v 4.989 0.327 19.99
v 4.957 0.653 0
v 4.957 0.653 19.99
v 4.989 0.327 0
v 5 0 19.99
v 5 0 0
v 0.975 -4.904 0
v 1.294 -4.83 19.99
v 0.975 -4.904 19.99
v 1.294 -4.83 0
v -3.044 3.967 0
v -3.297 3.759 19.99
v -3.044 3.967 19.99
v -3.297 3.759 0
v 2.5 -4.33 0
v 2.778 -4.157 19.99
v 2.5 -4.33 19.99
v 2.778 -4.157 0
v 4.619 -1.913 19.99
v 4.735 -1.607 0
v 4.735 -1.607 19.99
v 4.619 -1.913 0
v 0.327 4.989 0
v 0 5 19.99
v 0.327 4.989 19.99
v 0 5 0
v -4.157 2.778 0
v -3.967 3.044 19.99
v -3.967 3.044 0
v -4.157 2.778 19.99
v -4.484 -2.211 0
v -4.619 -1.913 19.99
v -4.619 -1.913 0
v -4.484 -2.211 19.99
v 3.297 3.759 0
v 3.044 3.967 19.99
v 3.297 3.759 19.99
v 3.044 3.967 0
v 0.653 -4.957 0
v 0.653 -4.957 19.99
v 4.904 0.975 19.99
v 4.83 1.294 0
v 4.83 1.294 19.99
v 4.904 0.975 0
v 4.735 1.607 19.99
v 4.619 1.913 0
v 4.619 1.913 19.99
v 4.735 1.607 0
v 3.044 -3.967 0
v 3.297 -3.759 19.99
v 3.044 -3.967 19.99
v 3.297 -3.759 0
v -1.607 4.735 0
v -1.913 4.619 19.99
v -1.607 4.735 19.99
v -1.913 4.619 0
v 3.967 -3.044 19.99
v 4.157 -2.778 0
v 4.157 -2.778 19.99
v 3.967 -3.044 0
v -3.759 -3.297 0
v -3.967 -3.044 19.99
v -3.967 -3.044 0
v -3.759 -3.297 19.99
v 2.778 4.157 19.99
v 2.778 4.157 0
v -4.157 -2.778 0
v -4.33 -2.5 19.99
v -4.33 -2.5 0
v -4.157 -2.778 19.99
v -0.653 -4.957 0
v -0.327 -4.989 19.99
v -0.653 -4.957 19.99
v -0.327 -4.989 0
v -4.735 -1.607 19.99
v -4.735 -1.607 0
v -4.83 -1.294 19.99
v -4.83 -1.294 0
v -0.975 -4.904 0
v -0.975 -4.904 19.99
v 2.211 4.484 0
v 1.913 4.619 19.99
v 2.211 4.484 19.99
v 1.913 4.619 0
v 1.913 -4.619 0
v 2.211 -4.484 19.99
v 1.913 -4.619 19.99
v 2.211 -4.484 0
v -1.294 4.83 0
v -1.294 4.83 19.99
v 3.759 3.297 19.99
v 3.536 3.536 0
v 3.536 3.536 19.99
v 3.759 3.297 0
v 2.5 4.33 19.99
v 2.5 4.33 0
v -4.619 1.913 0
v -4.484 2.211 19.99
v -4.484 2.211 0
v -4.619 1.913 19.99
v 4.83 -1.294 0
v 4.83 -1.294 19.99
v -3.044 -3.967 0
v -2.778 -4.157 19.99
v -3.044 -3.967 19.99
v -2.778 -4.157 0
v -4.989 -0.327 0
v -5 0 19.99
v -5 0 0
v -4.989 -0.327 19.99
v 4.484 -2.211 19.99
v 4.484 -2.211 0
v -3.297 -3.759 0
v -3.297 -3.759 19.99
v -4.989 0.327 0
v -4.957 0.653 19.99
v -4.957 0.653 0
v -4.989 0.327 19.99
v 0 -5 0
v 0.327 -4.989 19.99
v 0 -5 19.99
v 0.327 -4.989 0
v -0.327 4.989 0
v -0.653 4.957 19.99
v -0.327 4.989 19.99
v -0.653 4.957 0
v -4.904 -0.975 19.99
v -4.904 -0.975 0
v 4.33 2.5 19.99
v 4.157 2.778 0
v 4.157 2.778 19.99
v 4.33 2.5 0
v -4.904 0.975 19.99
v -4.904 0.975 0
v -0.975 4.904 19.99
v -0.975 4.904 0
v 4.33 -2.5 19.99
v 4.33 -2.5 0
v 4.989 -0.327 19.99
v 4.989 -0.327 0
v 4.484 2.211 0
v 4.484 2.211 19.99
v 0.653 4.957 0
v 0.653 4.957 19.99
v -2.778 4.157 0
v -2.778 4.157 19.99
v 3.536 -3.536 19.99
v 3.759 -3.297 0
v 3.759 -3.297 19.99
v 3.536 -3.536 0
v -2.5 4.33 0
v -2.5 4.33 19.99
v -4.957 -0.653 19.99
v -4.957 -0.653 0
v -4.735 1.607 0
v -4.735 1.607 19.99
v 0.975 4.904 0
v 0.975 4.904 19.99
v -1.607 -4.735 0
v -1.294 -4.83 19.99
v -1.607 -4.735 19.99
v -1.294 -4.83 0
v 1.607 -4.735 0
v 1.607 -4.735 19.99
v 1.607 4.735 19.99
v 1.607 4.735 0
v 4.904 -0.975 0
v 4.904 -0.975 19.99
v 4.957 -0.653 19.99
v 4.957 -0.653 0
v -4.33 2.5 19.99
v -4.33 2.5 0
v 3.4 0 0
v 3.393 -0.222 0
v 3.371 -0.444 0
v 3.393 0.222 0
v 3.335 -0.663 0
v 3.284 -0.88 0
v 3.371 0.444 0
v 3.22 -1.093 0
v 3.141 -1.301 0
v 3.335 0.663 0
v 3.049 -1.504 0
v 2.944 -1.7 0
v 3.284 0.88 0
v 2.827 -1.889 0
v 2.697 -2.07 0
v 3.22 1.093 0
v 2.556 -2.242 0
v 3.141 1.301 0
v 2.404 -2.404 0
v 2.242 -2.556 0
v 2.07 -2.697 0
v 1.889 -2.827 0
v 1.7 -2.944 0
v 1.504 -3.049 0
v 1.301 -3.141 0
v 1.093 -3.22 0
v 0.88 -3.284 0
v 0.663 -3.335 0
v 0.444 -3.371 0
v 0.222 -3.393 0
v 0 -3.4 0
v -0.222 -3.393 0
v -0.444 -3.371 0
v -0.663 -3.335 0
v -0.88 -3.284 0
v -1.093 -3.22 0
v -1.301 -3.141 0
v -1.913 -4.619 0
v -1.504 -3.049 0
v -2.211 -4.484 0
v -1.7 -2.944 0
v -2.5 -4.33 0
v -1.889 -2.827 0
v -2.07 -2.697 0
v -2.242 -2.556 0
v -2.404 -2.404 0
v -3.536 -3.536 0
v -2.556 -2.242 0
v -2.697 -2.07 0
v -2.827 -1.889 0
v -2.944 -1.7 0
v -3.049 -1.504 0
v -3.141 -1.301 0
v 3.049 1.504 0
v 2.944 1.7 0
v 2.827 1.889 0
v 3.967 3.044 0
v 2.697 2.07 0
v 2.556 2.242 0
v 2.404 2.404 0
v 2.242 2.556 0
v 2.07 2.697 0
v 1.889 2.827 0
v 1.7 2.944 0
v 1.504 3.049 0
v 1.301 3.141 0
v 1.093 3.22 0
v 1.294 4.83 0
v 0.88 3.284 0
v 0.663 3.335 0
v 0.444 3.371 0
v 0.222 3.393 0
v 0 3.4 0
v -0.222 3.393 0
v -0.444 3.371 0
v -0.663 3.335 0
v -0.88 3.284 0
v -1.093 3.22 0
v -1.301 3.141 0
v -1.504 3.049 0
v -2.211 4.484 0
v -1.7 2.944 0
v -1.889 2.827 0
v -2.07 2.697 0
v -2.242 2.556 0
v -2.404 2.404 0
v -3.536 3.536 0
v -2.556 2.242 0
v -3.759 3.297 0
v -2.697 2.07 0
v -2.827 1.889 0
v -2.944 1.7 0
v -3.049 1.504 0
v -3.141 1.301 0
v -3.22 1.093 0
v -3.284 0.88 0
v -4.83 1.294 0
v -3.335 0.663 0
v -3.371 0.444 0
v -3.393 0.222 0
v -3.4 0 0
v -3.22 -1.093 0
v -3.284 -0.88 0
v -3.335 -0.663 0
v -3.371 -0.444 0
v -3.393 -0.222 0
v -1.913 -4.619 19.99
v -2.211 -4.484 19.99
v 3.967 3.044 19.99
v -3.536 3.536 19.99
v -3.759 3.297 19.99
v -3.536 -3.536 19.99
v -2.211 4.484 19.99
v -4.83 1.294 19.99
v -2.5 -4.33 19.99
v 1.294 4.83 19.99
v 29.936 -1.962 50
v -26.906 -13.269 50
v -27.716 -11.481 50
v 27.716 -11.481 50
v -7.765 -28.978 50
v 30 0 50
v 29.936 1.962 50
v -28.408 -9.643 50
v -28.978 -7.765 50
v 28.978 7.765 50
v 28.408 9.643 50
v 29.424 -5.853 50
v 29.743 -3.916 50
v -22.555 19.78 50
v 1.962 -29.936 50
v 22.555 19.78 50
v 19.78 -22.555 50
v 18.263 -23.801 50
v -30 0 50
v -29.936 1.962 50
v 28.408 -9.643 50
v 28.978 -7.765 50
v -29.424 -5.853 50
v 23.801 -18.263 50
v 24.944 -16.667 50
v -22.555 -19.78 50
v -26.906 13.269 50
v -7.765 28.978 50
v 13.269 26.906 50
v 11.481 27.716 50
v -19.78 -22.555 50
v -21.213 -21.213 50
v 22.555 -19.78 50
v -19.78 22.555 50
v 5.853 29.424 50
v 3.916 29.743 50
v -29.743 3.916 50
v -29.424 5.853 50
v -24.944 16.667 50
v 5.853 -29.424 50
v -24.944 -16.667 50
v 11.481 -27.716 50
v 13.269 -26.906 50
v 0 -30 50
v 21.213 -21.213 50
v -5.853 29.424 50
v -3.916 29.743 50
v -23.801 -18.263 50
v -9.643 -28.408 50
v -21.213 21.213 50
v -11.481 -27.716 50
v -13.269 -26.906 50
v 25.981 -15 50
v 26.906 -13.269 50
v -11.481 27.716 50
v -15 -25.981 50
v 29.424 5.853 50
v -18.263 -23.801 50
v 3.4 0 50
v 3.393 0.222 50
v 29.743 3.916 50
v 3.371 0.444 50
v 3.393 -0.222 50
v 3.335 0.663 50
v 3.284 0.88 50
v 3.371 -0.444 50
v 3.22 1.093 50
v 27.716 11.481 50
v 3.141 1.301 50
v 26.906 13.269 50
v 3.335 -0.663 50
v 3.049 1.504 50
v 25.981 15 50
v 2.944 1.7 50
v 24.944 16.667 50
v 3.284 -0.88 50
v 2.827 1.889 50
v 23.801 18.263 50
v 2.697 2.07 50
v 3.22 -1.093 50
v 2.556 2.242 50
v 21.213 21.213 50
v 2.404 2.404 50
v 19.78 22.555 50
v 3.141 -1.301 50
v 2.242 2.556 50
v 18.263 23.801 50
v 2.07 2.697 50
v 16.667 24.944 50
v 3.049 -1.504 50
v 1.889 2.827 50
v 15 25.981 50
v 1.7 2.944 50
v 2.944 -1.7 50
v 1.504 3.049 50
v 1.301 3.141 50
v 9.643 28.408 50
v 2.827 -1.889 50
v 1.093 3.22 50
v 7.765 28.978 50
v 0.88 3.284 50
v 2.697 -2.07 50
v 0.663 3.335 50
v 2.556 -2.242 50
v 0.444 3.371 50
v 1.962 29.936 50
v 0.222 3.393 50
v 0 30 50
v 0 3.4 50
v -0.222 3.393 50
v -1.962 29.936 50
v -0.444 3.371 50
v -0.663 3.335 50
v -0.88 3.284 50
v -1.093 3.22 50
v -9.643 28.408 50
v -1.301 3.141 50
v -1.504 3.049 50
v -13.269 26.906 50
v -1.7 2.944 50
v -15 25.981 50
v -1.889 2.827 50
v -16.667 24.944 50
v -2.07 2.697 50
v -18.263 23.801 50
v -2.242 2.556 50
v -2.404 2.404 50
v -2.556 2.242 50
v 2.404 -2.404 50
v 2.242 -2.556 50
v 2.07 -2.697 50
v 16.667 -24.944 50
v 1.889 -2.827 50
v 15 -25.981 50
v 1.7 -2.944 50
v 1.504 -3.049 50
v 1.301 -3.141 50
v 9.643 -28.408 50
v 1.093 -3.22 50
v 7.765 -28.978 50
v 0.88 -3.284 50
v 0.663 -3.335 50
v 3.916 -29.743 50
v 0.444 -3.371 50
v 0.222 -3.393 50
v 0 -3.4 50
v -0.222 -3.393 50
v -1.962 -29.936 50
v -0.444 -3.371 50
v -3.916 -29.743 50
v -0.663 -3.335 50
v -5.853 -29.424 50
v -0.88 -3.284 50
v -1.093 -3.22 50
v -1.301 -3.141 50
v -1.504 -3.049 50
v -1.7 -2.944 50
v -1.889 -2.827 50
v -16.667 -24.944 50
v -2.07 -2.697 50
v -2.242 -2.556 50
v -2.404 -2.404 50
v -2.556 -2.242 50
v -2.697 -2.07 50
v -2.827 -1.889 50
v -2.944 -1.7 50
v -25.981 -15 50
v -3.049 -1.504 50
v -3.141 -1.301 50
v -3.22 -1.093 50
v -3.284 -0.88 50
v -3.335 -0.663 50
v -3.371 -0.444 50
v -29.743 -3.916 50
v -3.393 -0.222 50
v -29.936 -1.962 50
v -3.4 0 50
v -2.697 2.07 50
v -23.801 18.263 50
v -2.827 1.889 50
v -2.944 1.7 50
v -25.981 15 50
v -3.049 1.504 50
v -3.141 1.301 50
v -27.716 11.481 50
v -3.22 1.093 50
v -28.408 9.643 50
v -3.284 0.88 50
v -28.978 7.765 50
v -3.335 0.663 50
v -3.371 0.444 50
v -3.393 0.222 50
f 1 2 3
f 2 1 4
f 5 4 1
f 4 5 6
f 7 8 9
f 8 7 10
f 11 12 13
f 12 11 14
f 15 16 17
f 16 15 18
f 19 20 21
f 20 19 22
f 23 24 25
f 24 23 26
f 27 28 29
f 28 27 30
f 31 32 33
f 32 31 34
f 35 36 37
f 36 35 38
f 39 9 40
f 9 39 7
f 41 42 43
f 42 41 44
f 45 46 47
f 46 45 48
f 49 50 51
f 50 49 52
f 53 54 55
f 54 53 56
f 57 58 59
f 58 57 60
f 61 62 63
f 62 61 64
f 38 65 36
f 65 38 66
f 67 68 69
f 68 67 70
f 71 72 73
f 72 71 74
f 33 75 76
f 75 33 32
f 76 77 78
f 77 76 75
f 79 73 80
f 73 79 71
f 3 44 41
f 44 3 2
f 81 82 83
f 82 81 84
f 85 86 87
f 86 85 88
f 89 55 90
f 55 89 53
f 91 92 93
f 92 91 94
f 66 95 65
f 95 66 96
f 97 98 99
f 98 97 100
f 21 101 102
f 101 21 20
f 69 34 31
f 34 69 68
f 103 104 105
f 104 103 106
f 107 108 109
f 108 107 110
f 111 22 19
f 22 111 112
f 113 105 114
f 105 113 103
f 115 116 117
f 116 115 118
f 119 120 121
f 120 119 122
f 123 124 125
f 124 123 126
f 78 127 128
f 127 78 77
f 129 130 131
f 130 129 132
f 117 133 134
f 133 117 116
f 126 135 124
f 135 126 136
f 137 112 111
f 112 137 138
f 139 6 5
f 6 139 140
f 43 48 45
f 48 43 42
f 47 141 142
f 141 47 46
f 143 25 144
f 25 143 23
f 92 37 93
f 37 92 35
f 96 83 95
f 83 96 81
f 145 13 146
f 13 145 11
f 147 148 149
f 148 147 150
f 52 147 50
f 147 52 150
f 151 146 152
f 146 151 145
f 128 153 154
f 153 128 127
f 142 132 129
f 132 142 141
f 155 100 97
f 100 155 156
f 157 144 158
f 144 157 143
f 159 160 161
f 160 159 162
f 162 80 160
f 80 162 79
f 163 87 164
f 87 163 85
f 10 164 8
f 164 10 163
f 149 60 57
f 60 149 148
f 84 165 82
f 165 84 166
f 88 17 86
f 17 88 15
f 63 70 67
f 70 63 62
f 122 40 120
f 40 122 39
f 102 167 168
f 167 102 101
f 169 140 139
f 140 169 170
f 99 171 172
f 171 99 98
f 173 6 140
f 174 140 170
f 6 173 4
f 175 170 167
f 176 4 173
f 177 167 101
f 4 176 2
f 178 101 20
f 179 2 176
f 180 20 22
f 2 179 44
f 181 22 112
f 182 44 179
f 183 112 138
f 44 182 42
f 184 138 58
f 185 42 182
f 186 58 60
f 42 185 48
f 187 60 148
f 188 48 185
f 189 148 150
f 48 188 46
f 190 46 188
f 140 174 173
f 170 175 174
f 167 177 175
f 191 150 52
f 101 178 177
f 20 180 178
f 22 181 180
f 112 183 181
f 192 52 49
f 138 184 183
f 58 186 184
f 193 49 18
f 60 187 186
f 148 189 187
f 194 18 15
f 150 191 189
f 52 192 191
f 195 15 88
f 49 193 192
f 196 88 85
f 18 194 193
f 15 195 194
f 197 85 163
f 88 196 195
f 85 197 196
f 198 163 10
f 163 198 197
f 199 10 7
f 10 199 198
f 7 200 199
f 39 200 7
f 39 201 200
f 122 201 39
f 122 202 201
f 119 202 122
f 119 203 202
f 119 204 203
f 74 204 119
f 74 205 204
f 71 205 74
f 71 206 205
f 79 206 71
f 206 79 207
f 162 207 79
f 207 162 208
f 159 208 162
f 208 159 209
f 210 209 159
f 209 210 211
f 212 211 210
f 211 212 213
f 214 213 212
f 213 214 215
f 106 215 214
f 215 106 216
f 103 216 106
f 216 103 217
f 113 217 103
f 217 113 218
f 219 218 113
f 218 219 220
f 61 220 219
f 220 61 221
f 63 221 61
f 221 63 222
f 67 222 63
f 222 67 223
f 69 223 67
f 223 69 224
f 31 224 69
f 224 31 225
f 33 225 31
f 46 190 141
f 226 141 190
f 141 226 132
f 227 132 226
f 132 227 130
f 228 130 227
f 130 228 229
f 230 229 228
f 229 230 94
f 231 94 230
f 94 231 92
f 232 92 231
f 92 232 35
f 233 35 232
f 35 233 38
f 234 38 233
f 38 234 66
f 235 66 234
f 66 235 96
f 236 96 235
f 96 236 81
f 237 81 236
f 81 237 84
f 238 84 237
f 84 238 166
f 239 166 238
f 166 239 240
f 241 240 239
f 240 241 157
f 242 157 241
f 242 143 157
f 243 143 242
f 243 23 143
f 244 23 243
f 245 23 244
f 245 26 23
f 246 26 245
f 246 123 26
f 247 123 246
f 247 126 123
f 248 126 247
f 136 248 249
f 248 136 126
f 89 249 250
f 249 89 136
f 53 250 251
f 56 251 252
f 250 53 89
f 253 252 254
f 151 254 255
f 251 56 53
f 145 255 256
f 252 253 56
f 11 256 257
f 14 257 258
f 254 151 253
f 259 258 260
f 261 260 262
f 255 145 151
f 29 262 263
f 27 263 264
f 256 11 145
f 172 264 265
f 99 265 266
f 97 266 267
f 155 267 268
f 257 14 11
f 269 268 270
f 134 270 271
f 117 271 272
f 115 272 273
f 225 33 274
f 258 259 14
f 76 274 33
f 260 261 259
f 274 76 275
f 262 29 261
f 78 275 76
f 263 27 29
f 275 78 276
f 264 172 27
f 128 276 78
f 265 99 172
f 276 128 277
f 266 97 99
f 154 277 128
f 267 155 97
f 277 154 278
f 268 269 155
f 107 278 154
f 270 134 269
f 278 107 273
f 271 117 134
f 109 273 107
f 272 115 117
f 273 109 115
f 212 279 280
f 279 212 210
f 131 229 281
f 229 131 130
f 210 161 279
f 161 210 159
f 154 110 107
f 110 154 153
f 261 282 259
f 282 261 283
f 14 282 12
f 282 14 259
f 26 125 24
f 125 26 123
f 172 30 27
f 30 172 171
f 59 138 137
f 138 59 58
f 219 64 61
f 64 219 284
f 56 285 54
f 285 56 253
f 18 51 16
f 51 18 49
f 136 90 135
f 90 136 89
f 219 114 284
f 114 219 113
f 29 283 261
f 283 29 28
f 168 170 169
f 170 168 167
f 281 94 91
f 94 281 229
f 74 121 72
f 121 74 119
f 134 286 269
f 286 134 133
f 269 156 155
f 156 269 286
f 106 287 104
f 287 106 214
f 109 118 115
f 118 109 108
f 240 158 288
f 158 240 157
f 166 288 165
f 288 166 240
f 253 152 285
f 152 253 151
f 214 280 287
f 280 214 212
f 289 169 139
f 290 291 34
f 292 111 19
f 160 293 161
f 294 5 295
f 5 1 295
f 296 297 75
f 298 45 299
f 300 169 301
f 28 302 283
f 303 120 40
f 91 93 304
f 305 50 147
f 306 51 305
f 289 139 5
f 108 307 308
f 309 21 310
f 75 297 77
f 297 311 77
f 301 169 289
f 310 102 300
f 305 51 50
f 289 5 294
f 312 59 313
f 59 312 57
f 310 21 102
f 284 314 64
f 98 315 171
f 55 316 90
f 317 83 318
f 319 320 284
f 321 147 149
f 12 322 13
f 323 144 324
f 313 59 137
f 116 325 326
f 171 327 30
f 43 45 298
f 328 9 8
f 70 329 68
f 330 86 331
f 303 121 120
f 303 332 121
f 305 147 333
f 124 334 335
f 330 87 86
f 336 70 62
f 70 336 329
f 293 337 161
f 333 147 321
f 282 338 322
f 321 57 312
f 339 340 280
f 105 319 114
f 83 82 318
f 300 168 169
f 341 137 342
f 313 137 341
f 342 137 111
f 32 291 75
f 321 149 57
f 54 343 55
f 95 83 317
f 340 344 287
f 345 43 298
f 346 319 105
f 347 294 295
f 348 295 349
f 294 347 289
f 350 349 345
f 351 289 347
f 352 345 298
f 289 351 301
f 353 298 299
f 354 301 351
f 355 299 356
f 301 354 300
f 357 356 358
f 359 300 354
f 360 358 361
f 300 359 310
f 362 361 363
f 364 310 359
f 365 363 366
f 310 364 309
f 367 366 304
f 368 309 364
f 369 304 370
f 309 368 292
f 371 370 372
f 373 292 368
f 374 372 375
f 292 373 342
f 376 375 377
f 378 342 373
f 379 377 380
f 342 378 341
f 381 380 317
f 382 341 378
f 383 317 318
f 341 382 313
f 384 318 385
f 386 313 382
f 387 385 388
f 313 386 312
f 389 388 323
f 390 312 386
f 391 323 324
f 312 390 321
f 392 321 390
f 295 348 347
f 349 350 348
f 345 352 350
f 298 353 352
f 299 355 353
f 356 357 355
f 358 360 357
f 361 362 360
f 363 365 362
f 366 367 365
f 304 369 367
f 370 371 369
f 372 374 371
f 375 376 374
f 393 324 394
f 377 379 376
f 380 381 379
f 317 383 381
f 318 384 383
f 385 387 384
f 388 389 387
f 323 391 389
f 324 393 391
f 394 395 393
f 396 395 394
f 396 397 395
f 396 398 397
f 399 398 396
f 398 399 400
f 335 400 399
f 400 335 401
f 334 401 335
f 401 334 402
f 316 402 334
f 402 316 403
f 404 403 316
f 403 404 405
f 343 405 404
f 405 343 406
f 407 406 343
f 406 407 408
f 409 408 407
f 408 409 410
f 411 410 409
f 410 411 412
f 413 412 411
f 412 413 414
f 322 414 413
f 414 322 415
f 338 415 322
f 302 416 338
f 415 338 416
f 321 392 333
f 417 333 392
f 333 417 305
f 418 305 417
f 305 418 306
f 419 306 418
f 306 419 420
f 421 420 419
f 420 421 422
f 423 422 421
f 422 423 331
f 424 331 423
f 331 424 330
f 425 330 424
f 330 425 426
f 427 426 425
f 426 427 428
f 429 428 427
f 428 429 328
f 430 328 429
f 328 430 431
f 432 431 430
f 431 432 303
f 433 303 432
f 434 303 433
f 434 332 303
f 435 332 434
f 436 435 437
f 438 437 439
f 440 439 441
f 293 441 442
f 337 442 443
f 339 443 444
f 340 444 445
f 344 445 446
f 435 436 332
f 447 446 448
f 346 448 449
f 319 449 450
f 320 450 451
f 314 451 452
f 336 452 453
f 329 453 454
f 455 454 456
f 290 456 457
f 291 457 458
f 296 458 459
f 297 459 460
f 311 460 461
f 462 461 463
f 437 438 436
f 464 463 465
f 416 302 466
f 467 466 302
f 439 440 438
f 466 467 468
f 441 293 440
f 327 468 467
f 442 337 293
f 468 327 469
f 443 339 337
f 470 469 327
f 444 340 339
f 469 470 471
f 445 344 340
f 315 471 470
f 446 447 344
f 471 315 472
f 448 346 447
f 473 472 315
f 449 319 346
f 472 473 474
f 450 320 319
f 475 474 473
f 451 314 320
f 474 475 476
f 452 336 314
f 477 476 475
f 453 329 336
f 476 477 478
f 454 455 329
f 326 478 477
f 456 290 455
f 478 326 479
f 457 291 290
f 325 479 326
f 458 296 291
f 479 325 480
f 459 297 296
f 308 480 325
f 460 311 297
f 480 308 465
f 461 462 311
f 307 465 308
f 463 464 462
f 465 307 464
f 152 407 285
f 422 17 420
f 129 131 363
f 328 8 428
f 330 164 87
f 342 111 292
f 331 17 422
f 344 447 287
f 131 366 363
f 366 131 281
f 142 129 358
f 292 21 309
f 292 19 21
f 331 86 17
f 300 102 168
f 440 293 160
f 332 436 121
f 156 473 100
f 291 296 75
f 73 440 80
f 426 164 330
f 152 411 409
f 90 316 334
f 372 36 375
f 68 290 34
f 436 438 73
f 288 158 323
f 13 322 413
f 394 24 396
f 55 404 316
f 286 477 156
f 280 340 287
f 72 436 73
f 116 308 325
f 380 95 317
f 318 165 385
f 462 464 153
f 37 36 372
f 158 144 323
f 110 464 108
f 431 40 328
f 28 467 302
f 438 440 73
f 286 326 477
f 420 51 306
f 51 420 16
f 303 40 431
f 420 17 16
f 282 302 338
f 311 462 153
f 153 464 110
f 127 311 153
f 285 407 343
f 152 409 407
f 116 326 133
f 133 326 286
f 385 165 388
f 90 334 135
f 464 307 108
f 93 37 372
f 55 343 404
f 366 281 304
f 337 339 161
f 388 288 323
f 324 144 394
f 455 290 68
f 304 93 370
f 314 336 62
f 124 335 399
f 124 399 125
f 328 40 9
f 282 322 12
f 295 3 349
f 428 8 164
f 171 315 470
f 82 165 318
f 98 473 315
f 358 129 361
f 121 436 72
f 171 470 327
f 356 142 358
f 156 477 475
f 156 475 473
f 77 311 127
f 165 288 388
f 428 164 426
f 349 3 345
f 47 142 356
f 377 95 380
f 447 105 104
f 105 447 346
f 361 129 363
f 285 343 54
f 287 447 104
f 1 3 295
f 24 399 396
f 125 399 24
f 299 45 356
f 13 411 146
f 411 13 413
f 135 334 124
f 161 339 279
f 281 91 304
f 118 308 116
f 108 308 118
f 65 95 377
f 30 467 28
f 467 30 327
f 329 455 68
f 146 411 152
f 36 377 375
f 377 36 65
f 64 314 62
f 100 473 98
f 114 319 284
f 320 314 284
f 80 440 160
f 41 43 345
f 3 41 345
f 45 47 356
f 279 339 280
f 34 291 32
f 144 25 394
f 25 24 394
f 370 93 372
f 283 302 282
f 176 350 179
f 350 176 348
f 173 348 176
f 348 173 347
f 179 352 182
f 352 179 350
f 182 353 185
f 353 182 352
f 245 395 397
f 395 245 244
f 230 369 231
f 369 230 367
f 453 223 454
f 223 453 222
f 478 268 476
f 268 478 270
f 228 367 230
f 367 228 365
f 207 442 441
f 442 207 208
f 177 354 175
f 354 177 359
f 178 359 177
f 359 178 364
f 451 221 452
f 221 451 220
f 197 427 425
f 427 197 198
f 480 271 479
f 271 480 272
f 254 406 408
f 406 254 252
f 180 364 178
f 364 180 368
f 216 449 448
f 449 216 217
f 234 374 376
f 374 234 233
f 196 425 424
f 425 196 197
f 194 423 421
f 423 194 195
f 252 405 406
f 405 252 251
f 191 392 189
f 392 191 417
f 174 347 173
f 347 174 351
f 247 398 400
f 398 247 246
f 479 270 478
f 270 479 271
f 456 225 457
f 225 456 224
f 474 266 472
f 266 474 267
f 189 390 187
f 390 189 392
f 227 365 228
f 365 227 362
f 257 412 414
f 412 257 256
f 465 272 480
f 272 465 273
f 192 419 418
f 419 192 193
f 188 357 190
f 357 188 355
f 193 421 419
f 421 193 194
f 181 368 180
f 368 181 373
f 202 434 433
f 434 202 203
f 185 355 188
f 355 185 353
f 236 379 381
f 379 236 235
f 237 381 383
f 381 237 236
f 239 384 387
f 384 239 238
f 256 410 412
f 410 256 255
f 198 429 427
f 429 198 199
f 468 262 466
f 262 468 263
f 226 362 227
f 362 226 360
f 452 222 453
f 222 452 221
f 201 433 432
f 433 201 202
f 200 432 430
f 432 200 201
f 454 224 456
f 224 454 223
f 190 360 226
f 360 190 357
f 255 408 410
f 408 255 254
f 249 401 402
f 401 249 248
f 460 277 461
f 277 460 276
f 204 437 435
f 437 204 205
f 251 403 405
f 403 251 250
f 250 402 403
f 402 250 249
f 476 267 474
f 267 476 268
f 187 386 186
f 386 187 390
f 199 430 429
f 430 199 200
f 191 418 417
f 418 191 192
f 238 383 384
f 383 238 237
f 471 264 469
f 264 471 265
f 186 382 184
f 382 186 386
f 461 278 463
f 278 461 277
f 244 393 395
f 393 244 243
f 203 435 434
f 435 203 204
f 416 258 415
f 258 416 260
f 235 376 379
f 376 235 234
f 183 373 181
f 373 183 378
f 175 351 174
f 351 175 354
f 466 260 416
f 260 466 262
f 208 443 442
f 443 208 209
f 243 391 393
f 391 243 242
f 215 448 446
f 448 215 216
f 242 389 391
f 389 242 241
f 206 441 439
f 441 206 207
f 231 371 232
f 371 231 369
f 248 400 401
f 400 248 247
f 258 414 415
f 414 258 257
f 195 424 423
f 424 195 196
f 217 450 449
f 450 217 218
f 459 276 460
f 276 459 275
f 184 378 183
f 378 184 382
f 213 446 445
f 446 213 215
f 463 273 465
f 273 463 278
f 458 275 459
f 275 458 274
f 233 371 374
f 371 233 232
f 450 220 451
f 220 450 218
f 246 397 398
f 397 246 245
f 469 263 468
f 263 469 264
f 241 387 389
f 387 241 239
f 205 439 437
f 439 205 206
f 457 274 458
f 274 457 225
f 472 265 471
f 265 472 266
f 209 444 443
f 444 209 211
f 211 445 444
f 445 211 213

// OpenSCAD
// Small lab funnel, printed upright
// Units: mm

// ---- Parameters ----
spout_od      = 10;    // spout outer diameter
spout_len     = 20;    // spout length (z = 0 to 20)
cone_bottom_d = 10;    // cone outer diameter at z = 20
cone_top_d    = 60;    // cone outer diameter at rim (z = 50)
rim_z         = 50;    // rim height
wall          = 1.6;   // wall thickness everywhere

eps = 0.5;             // cutter overshoot past faces

$fn = 96;

// ---- Derived ----
spout_id = spout_od - 2 * wall;   // 6.8 mm bore

// ---- Model ----
difference() {
    union() {
        // Spout
        cylinder(d = spout_od, h = spout_len);
        // Cone (slightly overlaps spout to fuse cleanly)
        translate([0, 0, spout_len - 0.01])
            cylinder(d1 = cone_bottom_d, d2 = cone_top_d, h = rim_z - spout_len + 0.01);
    }
    // Hollow out the full height so liquid runs straight through
    translate([0, 0, -eps])
        cylinder(d = spout_id, h = rim_z + 2 * eps);
}
